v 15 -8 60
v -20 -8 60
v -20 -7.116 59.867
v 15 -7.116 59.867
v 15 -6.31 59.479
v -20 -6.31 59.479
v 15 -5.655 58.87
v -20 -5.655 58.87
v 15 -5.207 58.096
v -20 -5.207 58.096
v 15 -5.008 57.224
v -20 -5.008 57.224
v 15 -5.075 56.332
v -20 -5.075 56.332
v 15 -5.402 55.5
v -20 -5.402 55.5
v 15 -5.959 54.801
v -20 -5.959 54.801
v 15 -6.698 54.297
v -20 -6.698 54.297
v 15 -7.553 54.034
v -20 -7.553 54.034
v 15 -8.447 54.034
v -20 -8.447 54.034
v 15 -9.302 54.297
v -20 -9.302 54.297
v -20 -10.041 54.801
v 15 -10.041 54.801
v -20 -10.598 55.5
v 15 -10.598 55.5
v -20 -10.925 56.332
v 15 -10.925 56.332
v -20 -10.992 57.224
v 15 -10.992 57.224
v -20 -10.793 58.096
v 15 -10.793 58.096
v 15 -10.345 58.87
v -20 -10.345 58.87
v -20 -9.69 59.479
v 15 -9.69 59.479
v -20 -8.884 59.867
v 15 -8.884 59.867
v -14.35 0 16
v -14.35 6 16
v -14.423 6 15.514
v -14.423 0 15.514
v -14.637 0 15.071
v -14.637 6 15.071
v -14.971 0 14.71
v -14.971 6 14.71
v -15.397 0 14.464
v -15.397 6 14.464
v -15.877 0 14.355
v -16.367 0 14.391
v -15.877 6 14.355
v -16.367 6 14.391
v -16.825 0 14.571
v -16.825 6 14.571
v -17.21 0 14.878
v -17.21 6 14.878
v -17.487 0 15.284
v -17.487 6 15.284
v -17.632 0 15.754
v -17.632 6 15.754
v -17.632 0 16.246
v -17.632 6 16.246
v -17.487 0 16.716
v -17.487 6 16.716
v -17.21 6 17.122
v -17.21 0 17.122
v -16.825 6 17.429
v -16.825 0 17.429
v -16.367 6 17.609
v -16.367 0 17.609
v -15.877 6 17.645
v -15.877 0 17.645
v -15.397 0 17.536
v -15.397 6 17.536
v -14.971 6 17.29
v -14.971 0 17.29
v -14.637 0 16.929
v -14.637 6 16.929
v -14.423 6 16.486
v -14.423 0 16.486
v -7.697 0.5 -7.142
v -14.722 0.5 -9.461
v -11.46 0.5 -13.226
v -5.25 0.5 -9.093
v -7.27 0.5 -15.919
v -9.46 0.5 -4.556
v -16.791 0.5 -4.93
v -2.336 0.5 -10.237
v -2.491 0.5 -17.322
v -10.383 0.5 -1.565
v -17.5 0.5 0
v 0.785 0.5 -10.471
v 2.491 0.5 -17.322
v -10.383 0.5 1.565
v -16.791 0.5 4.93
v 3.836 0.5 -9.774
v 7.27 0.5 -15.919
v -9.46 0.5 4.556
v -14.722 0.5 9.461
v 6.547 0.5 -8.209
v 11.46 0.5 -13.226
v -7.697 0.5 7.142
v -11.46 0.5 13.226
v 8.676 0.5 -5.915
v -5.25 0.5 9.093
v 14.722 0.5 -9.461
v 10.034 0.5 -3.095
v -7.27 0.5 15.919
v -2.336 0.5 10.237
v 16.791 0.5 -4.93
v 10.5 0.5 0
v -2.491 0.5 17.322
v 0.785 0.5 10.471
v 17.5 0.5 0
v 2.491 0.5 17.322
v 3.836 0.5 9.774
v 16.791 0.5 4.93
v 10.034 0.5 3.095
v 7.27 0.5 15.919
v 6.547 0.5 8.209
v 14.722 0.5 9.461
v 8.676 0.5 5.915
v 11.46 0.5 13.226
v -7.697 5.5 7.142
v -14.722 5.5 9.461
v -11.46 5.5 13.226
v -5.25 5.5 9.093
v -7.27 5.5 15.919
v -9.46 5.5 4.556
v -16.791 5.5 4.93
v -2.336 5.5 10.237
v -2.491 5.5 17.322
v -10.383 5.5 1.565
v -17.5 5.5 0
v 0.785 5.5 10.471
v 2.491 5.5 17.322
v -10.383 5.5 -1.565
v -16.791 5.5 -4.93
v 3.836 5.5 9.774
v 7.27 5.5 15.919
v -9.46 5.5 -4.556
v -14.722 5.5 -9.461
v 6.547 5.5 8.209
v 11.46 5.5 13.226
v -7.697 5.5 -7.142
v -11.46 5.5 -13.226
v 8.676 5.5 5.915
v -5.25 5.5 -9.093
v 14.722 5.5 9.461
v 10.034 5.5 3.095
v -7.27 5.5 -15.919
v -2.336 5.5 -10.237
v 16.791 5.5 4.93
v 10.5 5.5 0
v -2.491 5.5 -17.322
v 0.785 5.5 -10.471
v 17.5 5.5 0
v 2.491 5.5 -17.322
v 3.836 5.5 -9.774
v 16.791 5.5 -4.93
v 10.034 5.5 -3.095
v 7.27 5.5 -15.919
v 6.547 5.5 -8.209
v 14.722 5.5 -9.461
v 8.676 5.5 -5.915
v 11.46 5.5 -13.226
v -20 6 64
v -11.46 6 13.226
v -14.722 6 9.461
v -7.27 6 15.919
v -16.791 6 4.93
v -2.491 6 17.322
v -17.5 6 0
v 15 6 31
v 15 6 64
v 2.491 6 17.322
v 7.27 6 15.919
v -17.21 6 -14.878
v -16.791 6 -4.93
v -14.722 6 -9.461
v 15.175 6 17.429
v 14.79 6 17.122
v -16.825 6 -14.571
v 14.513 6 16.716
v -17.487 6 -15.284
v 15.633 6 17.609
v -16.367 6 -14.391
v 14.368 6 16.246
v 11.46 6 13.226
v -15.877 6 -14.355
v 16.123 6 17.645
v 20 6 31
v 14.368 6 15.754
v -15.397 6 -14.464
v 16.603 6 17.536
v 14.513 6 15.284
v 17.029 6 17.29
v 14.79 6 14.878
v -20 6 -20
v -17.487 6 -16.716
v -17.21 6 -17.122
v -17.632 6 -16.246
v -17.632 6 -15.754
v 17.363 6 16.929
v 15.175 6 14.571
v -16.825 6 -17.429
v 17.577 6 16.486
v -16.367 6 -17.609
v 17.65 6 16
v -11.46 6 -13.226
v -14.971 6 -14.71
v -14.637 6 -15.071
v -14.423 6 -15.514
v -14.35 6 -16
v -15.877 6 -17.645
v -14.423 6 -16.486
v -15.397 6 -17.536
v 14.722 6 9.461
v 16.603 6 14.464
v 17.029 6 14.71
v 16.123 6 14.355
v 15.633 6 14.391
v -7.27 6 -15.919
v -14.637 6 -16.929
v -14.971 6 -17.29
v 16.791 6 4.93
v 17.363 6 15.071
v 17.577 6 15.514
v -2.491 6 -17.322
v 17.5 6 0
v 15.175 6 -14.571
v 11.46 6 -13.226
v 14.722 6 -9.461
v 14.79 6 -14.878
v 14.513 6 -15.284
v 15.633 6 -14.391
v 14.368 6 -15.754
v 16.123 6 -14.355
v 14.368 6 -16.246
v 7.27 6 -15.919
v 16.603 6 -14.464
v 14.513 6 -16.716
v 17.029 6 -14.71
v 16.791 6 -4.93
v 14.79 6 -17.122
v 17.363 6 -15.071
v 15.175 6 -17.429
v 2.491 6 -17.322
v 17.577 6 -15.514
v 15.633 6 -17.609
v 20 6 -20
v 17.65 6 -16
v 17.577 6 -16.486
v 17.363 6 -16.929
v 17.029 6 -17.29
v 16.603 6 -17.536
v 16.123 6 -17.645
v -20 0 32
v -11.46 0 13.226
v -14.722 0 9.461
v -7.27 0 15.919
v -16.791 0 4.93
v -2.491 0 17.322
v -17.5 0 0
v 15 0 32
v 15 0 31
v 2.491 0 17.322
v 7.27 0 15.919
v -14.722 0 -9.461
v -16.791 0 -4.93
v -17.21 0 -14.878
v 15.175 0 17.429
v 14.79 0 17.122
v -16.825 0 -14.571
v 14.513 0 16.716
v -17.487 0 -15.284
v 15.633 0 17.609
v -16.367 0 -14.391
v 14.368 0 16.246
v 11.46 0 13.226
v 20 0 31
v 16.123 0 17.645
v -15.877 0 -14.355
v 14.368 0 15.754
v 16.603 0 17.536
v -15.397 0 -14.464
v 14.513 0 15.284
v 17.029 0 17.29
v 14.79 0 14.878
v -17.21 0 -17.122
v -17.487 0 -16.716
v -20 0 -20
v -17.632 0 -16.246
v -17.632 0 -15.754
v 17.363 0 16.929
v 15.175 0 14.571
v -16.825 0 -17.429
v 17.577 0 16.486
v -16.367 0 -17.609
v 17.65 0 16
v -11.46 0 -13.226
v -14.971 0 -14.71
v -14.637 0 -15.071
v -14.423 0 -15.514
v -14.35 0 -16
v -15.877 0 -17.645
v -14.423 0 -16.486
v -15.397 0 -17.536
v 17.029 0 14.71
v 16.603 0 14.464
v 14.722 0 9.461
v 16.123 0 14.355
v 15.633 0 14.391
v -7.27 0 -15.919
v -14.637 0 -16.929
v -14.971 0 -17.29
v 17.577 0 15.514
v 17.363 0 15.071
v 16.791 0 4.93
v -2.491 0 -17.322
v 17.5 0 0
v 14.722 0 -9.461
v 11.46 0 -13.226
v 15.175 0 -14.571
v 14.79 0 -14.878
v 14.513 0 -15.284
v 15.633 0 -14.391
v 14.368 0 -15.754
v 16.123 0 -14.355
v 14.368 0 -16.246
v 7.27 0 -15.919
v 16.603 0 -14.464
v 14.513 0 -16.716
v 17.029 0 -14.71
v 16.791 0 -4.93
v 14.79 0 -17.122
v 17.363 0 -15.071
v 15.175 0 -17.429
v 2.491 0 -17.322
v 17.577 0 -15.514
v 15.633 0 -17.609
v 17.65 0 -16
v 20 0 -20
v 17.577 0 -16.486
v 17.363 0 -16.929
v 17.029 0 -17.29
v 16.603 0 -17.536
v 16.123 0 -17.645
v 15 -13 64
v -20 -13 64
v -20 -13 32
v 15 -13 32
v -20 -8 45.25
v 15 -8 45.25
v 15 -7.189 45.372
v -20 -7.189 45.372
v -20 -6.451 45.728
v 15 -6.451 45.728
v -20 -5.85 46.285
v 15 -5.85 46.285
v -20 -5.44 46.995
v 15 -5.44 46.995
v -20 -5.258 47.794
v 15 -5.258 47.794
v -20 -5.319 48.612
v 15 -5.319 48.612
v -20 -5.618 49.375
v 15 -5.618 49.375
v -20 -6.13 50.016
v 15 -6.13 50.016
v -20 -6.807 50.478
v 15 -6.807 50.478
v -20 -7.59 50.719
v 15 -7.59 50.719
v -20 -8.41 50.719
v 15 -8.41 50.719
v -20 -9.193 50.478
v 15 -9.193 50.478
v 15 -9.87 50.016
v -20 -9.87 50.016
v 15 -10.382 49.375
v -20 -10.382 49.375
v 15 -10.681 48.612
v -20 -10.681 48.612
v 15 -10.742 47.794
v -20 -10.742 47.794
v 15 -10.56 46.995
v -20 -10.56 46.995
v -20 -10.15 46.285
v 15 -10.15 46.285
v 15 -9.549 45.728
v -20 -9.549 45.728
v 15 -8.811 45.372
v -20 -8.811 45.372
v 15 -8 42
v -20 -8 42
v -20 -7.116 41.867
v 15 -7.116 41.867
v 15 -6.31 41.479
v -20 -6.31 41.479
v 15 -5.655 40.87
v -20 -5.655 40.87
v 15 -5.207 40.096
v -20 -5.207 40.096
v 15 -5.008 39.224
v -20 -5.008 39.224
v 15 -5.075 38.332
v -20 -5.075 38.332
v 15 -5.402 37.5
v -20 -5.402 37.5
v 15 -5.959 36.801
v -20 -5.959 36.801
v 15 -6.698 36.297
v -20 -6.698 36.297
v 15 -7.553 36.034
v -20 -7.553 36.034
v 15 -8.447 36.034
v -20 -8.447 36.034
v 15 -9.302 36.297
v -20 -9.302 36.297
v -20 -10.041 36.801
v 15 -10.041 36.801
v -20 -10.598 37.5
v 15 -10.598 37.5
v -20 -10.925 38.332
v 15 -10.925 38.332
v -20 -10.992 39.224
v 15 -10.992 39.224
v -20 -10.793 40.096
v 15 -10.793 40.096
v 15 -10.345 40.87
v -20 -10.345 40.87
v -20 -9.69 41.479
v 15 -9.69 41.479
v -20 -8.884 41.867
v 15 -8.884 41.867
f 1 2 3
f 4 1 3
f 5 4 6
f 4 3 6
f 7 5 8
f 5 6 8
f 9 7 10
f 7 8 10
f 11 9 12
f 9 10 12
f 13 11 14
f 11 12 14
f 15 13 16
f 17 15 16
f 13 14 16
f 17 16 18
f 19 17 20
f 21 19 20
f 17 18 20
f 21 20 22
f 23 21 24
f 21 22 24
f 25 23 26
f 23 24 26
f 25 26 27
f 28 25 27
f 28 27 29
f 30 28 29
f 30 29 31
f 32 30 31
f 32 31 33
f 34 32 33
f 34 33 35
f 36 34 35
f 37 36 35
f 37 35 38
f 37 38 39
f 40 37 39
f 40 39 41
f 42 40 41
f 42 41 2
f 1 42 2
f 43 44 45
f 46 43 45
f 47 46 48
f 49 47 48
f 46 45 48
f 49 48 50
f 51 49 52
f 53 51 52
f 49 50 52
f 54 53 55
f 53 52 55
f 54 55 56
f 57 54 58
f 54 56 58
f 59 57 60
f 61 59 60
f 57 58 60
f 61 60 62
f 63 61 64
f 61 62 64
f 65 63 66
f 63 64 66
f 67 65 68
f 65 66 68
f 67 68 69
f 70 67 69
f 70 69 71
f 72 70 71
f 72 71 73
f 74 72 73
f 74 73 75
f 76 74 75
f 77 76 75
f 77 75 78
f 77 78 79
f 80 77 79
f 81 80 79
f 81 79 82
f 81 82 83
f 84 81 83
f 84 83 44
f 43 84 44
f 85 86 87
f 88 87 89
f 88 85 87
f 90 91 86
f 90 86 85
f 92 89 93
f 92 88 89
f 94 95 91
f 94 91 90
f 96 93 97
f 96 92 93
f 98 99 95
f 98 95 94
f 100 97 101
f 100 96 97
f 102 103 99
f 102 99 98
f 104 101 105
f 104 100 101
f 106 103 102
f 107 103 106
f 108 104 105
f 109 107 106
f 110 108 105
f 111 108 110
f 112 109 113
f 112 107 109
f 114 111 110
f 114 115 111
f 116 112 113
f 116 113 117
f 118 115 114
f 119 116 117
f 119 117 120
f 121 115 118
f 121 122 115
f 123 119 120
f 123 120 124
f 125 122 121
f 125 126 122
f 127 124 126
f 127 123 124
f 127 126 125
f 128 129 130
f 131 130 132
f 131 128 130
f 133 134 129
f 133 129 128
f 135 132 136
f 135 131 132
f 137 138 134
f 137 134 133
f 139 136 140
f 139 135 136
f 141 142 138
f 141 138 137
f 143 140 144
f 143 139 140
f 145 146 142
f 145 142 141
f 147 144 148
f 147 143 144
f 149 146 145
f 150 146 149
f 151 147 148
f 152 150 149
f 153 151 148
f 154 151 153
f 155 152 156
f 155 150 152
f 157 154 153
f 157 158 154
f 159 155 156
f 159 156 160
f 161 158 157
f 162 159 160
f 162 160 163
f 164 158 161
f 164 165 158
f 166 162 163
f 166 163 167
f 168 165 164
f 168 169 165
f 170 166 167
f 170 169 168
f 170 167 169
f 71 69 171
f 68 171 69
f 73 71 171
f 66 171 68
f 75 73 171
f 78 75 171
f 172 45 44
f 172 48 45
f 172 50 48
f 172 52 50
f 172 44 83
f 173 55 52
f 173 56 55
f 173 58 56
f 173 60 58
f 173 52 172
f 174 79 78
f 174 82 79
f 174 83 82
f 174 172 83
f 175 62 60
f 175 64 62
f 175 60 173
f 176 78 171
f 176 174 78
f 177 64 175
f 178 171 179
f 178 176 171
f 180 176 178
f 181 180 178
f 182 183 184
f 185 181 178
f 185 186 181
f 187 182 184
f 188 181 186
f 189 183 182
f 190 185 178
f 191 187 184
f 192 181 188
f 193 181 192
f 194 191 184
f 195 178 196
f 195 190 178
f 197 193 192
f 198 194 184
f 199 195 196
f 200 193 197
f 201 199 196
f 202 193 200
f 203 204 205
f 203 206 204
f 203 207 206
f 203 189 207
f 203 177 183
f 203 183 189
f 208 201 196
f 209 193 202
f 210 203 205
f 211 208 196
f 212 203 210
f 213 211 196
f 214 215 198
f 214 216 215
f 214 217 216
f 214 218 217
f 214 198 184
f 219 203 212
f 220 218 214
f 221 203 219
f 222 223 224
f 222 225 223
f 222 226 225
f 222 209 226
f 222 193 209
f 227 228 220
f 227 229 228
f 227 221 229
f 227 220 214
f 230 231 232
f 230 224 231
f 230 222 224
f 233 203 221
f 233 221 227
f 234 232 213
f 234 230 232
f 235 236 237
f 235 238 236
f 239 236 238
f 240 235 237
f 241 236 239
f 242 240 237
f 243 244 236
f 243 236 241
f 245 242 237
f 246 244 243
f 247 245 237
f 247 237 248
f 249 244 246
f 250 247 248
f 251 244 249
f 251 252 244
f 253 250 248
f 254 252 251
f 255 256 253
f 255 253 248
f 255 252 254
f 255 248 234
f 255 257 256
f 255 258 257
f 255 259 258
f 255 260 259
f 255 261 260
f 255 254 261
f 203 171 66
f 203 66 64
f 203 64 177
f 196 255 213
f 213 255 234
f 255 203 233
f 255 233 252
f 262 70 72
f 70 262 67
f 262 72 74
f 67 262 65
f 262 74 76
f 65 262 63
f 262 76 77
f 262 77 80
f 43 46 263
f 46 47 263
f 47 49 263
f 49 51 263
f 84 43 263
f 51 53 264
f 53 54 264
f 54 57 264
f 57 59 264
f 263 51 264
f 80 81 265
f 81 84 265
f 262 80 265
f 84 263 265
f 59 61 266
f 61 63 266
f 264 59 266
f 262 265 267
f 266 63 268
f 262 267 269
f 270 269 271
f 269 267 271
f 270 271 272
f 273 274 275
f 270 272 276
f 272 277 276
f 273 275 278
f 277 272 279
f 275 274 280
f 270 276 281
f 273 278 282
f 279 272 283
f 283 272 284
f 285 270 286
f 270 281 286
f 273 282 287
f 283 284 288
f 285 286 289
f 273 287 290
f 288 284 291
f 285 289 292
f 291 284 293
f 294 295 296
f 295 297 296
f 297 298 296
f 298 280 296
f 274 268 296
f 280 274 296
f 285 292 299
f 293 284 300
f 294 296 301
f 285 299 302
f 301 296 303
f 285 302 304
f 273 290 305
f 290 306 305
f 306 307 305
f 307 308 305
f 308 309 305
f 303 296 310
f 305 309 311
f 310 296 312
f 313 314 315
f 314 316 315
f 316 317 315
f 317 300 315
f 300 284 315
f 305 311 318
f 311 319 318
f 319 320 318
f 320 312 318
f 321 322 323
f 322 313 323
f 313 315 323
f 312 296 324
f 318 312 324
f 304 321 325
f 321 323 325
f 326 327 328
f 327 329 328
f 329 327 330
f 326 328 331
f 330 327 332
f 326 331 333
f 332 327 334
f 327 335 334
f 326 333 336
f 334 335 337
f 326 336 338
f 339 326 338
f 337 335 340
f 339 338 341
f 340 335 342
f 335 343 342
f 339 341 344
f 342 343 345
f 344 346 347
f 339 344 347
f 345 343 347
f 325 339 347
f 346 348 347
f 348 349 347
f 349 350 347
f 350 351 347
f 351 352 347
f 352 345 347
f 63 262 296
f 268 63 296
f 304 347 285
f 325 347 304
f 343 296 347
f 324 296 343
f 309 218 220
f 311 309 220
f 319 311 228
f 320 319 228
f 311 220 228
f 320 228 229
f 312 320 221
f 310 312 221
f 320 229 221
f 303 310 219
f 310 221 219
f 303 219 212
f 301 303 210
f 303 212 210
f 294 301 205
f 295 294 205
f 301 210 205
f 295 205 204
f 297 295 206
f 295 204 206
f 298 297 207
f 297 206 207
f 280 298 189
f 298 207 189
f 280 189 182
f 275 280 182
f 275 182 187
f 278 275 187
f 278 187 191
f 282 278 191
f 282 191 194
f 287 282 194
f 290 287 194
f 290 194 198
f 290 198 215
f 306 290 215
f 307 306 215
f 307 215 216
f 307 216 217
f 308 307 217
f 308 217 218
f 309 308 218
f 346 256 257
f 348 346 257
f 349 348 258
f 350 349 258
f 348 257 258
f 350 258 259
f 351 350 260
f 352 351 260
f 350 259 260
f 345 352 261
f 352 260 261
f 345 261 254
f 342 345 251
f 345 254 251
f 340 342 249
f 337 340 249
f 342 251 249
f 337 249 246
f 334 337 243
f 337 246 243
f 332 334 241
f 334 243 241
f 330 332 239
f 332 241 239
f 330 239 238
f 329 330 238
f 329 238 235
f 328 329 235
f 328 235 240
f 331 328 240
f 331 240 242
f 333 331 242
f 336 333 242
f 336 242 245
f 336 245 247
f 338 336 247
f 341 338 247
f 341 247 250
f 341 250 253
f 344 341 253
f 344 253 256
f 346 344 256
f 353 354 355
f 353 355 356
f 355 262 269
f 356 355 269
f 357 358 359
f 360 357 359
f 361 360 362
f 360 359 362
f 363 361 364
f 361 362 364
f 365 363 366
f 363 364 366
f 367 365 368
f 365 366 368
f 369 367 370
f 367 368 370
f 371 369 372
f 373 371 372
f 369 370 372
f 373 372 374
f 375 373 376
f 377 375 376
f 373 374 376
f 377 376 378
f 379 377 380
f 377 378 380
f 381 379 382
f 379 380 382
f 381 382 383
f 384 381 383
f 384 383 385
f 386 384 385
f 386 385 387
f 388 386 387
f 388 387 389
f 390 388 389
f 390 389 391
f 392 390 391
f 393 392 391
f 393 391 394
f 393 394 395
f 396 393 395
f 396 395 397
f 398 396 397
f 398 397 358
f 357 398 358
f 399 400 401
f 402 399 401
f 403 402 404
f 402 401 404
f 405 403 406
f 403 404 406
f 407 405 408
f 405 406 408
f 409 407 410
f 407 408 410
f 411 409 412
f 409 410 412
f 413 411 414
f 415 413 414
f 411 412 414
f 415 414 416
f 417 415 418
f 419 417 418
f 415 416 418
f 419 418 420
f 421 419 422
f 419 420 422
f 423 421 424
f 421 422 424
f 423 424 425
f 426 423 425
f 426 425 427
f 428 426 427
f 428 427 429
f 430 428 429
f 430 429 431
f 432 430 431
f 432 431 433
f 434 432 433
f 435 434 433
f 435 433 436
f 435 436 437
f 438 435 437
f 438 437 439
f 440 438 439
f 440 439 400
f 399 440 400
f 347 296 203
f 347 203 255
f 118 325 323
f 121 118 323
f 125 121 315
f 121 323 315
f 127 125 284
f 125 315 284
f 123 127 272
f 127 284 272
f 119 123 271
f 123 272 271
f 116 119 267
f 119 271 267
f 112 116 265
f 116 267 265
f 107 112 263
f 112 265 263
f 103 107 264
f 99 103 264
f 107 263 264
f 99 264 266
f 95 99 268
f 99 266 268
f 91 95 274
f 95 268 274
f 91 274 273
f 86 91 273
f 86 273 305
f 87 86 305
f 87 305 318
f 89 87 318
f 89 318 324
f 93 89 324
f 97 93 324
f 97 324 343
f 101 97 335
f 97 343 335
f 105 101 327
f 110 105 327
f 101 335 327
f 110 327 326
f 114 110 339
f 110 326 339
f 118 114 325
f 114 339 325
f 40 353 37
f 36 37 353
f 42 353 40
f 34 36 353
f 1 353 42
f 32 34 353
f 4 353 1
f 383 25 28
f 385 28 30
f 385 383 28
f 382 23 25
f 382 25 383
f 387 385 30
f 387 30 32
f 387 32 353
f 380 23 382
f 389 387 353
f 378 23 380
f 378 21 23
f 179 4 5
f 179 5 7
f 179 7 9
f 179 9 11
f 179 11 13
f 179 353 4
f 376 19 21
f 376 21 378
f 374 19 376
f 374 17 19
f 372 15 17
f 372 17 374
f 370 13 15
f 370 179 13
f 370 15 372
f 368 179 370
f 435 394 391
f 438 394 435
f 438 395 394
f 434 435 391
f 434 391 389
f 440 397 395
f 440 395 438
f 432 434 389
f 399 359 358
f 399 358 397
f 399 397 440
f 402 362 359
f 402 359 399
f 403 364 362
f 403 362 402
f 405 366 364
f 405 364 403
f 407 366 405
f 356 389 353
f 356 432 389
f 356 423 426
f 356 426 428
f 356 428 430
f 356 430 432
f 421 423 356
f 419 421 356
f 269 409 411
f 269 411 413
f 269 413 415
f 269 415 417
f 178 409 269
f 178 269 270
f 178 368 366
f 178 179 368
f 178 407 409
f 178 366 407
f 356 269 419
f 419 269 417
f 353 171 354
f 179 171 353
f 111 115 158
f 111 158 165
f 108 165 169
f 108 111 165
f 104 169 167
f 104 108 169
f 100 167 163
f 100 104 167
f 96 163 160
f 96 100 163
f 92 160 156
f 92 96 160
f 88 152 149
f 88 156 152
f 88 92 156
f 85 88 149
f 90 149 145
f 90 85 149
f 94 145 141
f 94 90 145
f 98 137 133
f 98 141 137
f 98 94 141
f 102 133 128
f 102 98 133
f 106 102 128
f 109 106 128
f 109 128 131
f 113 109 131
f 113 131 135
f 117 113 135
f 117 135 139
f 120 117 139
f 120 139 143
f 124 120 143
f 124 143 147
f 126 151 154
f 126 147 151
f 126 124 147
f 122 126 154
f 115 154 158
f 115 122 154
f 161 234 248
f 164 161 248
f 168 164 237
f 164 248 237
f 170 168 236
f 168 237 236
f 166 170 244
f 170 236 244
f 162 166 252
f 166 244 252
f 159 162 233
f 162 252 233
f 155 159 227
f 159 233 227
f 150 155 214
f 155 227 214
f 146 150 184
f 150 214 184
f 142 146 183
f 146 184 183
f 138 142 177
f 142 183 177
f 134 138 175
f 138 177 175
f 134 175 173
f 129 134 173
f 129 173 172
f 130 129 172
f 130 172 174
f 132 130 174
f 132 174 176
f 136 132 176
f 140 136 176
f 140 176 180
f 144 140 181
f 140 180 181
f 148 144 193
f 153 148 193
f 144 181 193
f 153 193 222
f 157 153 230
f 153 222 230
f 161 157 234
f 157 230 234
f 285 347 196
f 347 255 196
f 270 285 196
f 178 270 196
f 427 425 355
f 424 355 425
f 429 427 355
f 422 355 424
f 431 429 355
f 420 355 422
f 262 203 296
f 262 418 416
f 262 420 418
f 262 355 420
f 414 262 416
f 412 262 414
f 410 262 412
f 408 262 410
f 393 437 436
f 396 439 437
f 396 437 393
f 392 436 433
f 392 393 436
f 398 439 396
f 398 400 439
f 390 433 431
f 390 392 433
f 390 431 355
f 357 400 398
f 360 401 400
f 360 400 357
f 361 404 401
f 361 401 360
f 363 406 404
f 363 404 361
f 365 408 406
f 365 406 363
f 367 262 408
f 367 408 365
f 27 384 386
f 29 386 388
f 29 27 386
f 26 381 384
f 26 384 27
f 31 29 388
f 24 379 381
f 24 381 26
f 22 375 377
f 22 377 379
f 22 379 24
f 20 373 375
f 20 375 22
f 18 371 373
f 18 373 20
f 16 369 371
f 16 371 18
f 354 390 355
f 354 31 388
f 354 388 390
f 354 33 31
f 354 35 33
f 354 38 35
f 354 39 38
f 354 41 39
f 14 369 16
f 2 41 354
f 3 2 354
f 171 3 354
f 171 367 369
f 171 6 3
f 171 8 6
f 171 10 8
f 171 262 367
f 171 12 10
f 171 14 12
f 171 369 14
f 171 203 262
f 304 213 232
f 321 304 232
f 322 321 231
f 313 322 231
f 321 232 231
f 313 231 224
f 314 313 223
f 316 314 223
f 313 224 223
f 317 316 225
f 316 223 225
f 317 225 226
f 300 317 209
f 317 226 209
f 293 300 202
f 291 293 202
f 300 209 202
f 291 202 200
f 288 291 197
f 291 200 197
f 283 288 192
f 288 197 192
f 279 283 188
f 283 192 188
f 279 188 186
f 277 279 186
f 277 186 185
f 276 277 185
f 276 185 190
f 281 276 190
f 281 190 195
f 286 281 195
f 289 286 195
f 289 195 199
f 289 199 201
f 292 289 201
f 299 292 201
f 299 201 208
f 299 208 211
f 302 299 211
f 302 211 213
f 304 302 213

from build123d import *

# Parameters (mm, degrees)
SKETCH1_W             = 40
SKETCH1_H             = 84
SKETCH1_R             = 10.5
BOSS_EXTRUDE1_DEPTH   = 6
SKETCH2_W             = 40
SKETCH2_H             = 32
BOSS_EXTRUDE2_DEPTH   = 13
F_6_0MM_DOWEL_HOLE1_D = 6
M5_CLEARANCE_HOLE1_D  = 5.5
M4X0_7_TAPPED_HOLE1_D = 3.3
SKETCH12_R            = 17.5
CUT_EXTRUDE1_DEPTH    = 0.5
SKETCH13_R            = 17.5
CUT_EXTRUDE2_DEPTH    = 0.5
SKETCH14_W            = 33
SKETCH14_H            = 19
CUT_EXTRUDE3_DEPTH    = 5


with BuildPart() as part:
    # Sketch1 → Boss-Extrude1 (new body)
    with BuildSketch(Plane(origin=(0, 0, 0), x_dir=(1, 0, 0), z_dir=(0, 1, 0))):
        with Locations((0, -22)):
            Rectangle(SKETCH1_W, SKETCH1_H)
        Circle(SKETCH1_R, mode=Mode.SUBTRACT)
    extrude(amount=BOSS_EXTRUDE1_DEPTH)

    # Sketch2 → Boss-Extrude2 (add)
    with BuildSketch(Plane.XZ):
        with Locations((0, 48)):
            Rectangle(SKETCH2_W, SKETCH2_H)
    extrude(amount=BOSS_EXTRUDE2_DEPTH)

    # Ø6.0mm Dowel Hole1 (through all)
    with Locations(Plane(origin=(20, 0, 0), x_dir=(0, 0, -1), z_dir=(1, 0, 0))):
        with Locations((-57, -8), (-39, -8)):
            Hole(F_6_0MM_DOWEL_HOLE1_D / 2)

    # M5 Clearance Hole1 (through all)
    with Locations(Plane.ZY.offset(20)):
        with Locations((48, -8)):
            Hole(M5_CLEARANCE_HOLE1_D / 2)

    # M4x0.7 Tapped Hole1 (through all)
    with Locations(Plane(origin=(0, 0, 0), x_dir=(-1, 0, 0), z_dir=(0, -1, 0))):
        with Locations((16, 16), (-16, 16), (-16, -16), (16, -16)):
            Hole(M4X0_7_TAPPED_HOLE1_D / 2)

    # Sketch12 → Cut-Extrude1 (cut)
    with BuildSketch(Plane(origin=(0, 6, 0), x_dir=(1, 0, 0), z_dir=(0, 1, 0))):
        Circle(SKETCH12_R)
    extrude(amount=-CUT_EXTRUDE1_DEPTH, mode=Mode.SUBTRACT)

    # Sketch13 → Cut-Extrude2 (cut)
    with BuildSketch(Plane.XZ):
        Circle(SKETCH13_R)
    extrude(amount=-CUT_EXTRUDE2_DEPTH, mode=Mode.SUBTRACT)

    # Sketch14 → Cut-Extrude3 (cut)
    with BuildSketch(Plane(origin=(20, 0, 0), x_dir=(0, 0, -1), z_dir=(1, 0, 0))):
        with Locations((-47.5, -3.5)):
            Rectangle(SKETCH14_W, SKETCH14_H)
    extrude(amount=-CUT_EXTRUDE3_DEPTH, mode=Mode.SUBTRACT)


solid = part.part
